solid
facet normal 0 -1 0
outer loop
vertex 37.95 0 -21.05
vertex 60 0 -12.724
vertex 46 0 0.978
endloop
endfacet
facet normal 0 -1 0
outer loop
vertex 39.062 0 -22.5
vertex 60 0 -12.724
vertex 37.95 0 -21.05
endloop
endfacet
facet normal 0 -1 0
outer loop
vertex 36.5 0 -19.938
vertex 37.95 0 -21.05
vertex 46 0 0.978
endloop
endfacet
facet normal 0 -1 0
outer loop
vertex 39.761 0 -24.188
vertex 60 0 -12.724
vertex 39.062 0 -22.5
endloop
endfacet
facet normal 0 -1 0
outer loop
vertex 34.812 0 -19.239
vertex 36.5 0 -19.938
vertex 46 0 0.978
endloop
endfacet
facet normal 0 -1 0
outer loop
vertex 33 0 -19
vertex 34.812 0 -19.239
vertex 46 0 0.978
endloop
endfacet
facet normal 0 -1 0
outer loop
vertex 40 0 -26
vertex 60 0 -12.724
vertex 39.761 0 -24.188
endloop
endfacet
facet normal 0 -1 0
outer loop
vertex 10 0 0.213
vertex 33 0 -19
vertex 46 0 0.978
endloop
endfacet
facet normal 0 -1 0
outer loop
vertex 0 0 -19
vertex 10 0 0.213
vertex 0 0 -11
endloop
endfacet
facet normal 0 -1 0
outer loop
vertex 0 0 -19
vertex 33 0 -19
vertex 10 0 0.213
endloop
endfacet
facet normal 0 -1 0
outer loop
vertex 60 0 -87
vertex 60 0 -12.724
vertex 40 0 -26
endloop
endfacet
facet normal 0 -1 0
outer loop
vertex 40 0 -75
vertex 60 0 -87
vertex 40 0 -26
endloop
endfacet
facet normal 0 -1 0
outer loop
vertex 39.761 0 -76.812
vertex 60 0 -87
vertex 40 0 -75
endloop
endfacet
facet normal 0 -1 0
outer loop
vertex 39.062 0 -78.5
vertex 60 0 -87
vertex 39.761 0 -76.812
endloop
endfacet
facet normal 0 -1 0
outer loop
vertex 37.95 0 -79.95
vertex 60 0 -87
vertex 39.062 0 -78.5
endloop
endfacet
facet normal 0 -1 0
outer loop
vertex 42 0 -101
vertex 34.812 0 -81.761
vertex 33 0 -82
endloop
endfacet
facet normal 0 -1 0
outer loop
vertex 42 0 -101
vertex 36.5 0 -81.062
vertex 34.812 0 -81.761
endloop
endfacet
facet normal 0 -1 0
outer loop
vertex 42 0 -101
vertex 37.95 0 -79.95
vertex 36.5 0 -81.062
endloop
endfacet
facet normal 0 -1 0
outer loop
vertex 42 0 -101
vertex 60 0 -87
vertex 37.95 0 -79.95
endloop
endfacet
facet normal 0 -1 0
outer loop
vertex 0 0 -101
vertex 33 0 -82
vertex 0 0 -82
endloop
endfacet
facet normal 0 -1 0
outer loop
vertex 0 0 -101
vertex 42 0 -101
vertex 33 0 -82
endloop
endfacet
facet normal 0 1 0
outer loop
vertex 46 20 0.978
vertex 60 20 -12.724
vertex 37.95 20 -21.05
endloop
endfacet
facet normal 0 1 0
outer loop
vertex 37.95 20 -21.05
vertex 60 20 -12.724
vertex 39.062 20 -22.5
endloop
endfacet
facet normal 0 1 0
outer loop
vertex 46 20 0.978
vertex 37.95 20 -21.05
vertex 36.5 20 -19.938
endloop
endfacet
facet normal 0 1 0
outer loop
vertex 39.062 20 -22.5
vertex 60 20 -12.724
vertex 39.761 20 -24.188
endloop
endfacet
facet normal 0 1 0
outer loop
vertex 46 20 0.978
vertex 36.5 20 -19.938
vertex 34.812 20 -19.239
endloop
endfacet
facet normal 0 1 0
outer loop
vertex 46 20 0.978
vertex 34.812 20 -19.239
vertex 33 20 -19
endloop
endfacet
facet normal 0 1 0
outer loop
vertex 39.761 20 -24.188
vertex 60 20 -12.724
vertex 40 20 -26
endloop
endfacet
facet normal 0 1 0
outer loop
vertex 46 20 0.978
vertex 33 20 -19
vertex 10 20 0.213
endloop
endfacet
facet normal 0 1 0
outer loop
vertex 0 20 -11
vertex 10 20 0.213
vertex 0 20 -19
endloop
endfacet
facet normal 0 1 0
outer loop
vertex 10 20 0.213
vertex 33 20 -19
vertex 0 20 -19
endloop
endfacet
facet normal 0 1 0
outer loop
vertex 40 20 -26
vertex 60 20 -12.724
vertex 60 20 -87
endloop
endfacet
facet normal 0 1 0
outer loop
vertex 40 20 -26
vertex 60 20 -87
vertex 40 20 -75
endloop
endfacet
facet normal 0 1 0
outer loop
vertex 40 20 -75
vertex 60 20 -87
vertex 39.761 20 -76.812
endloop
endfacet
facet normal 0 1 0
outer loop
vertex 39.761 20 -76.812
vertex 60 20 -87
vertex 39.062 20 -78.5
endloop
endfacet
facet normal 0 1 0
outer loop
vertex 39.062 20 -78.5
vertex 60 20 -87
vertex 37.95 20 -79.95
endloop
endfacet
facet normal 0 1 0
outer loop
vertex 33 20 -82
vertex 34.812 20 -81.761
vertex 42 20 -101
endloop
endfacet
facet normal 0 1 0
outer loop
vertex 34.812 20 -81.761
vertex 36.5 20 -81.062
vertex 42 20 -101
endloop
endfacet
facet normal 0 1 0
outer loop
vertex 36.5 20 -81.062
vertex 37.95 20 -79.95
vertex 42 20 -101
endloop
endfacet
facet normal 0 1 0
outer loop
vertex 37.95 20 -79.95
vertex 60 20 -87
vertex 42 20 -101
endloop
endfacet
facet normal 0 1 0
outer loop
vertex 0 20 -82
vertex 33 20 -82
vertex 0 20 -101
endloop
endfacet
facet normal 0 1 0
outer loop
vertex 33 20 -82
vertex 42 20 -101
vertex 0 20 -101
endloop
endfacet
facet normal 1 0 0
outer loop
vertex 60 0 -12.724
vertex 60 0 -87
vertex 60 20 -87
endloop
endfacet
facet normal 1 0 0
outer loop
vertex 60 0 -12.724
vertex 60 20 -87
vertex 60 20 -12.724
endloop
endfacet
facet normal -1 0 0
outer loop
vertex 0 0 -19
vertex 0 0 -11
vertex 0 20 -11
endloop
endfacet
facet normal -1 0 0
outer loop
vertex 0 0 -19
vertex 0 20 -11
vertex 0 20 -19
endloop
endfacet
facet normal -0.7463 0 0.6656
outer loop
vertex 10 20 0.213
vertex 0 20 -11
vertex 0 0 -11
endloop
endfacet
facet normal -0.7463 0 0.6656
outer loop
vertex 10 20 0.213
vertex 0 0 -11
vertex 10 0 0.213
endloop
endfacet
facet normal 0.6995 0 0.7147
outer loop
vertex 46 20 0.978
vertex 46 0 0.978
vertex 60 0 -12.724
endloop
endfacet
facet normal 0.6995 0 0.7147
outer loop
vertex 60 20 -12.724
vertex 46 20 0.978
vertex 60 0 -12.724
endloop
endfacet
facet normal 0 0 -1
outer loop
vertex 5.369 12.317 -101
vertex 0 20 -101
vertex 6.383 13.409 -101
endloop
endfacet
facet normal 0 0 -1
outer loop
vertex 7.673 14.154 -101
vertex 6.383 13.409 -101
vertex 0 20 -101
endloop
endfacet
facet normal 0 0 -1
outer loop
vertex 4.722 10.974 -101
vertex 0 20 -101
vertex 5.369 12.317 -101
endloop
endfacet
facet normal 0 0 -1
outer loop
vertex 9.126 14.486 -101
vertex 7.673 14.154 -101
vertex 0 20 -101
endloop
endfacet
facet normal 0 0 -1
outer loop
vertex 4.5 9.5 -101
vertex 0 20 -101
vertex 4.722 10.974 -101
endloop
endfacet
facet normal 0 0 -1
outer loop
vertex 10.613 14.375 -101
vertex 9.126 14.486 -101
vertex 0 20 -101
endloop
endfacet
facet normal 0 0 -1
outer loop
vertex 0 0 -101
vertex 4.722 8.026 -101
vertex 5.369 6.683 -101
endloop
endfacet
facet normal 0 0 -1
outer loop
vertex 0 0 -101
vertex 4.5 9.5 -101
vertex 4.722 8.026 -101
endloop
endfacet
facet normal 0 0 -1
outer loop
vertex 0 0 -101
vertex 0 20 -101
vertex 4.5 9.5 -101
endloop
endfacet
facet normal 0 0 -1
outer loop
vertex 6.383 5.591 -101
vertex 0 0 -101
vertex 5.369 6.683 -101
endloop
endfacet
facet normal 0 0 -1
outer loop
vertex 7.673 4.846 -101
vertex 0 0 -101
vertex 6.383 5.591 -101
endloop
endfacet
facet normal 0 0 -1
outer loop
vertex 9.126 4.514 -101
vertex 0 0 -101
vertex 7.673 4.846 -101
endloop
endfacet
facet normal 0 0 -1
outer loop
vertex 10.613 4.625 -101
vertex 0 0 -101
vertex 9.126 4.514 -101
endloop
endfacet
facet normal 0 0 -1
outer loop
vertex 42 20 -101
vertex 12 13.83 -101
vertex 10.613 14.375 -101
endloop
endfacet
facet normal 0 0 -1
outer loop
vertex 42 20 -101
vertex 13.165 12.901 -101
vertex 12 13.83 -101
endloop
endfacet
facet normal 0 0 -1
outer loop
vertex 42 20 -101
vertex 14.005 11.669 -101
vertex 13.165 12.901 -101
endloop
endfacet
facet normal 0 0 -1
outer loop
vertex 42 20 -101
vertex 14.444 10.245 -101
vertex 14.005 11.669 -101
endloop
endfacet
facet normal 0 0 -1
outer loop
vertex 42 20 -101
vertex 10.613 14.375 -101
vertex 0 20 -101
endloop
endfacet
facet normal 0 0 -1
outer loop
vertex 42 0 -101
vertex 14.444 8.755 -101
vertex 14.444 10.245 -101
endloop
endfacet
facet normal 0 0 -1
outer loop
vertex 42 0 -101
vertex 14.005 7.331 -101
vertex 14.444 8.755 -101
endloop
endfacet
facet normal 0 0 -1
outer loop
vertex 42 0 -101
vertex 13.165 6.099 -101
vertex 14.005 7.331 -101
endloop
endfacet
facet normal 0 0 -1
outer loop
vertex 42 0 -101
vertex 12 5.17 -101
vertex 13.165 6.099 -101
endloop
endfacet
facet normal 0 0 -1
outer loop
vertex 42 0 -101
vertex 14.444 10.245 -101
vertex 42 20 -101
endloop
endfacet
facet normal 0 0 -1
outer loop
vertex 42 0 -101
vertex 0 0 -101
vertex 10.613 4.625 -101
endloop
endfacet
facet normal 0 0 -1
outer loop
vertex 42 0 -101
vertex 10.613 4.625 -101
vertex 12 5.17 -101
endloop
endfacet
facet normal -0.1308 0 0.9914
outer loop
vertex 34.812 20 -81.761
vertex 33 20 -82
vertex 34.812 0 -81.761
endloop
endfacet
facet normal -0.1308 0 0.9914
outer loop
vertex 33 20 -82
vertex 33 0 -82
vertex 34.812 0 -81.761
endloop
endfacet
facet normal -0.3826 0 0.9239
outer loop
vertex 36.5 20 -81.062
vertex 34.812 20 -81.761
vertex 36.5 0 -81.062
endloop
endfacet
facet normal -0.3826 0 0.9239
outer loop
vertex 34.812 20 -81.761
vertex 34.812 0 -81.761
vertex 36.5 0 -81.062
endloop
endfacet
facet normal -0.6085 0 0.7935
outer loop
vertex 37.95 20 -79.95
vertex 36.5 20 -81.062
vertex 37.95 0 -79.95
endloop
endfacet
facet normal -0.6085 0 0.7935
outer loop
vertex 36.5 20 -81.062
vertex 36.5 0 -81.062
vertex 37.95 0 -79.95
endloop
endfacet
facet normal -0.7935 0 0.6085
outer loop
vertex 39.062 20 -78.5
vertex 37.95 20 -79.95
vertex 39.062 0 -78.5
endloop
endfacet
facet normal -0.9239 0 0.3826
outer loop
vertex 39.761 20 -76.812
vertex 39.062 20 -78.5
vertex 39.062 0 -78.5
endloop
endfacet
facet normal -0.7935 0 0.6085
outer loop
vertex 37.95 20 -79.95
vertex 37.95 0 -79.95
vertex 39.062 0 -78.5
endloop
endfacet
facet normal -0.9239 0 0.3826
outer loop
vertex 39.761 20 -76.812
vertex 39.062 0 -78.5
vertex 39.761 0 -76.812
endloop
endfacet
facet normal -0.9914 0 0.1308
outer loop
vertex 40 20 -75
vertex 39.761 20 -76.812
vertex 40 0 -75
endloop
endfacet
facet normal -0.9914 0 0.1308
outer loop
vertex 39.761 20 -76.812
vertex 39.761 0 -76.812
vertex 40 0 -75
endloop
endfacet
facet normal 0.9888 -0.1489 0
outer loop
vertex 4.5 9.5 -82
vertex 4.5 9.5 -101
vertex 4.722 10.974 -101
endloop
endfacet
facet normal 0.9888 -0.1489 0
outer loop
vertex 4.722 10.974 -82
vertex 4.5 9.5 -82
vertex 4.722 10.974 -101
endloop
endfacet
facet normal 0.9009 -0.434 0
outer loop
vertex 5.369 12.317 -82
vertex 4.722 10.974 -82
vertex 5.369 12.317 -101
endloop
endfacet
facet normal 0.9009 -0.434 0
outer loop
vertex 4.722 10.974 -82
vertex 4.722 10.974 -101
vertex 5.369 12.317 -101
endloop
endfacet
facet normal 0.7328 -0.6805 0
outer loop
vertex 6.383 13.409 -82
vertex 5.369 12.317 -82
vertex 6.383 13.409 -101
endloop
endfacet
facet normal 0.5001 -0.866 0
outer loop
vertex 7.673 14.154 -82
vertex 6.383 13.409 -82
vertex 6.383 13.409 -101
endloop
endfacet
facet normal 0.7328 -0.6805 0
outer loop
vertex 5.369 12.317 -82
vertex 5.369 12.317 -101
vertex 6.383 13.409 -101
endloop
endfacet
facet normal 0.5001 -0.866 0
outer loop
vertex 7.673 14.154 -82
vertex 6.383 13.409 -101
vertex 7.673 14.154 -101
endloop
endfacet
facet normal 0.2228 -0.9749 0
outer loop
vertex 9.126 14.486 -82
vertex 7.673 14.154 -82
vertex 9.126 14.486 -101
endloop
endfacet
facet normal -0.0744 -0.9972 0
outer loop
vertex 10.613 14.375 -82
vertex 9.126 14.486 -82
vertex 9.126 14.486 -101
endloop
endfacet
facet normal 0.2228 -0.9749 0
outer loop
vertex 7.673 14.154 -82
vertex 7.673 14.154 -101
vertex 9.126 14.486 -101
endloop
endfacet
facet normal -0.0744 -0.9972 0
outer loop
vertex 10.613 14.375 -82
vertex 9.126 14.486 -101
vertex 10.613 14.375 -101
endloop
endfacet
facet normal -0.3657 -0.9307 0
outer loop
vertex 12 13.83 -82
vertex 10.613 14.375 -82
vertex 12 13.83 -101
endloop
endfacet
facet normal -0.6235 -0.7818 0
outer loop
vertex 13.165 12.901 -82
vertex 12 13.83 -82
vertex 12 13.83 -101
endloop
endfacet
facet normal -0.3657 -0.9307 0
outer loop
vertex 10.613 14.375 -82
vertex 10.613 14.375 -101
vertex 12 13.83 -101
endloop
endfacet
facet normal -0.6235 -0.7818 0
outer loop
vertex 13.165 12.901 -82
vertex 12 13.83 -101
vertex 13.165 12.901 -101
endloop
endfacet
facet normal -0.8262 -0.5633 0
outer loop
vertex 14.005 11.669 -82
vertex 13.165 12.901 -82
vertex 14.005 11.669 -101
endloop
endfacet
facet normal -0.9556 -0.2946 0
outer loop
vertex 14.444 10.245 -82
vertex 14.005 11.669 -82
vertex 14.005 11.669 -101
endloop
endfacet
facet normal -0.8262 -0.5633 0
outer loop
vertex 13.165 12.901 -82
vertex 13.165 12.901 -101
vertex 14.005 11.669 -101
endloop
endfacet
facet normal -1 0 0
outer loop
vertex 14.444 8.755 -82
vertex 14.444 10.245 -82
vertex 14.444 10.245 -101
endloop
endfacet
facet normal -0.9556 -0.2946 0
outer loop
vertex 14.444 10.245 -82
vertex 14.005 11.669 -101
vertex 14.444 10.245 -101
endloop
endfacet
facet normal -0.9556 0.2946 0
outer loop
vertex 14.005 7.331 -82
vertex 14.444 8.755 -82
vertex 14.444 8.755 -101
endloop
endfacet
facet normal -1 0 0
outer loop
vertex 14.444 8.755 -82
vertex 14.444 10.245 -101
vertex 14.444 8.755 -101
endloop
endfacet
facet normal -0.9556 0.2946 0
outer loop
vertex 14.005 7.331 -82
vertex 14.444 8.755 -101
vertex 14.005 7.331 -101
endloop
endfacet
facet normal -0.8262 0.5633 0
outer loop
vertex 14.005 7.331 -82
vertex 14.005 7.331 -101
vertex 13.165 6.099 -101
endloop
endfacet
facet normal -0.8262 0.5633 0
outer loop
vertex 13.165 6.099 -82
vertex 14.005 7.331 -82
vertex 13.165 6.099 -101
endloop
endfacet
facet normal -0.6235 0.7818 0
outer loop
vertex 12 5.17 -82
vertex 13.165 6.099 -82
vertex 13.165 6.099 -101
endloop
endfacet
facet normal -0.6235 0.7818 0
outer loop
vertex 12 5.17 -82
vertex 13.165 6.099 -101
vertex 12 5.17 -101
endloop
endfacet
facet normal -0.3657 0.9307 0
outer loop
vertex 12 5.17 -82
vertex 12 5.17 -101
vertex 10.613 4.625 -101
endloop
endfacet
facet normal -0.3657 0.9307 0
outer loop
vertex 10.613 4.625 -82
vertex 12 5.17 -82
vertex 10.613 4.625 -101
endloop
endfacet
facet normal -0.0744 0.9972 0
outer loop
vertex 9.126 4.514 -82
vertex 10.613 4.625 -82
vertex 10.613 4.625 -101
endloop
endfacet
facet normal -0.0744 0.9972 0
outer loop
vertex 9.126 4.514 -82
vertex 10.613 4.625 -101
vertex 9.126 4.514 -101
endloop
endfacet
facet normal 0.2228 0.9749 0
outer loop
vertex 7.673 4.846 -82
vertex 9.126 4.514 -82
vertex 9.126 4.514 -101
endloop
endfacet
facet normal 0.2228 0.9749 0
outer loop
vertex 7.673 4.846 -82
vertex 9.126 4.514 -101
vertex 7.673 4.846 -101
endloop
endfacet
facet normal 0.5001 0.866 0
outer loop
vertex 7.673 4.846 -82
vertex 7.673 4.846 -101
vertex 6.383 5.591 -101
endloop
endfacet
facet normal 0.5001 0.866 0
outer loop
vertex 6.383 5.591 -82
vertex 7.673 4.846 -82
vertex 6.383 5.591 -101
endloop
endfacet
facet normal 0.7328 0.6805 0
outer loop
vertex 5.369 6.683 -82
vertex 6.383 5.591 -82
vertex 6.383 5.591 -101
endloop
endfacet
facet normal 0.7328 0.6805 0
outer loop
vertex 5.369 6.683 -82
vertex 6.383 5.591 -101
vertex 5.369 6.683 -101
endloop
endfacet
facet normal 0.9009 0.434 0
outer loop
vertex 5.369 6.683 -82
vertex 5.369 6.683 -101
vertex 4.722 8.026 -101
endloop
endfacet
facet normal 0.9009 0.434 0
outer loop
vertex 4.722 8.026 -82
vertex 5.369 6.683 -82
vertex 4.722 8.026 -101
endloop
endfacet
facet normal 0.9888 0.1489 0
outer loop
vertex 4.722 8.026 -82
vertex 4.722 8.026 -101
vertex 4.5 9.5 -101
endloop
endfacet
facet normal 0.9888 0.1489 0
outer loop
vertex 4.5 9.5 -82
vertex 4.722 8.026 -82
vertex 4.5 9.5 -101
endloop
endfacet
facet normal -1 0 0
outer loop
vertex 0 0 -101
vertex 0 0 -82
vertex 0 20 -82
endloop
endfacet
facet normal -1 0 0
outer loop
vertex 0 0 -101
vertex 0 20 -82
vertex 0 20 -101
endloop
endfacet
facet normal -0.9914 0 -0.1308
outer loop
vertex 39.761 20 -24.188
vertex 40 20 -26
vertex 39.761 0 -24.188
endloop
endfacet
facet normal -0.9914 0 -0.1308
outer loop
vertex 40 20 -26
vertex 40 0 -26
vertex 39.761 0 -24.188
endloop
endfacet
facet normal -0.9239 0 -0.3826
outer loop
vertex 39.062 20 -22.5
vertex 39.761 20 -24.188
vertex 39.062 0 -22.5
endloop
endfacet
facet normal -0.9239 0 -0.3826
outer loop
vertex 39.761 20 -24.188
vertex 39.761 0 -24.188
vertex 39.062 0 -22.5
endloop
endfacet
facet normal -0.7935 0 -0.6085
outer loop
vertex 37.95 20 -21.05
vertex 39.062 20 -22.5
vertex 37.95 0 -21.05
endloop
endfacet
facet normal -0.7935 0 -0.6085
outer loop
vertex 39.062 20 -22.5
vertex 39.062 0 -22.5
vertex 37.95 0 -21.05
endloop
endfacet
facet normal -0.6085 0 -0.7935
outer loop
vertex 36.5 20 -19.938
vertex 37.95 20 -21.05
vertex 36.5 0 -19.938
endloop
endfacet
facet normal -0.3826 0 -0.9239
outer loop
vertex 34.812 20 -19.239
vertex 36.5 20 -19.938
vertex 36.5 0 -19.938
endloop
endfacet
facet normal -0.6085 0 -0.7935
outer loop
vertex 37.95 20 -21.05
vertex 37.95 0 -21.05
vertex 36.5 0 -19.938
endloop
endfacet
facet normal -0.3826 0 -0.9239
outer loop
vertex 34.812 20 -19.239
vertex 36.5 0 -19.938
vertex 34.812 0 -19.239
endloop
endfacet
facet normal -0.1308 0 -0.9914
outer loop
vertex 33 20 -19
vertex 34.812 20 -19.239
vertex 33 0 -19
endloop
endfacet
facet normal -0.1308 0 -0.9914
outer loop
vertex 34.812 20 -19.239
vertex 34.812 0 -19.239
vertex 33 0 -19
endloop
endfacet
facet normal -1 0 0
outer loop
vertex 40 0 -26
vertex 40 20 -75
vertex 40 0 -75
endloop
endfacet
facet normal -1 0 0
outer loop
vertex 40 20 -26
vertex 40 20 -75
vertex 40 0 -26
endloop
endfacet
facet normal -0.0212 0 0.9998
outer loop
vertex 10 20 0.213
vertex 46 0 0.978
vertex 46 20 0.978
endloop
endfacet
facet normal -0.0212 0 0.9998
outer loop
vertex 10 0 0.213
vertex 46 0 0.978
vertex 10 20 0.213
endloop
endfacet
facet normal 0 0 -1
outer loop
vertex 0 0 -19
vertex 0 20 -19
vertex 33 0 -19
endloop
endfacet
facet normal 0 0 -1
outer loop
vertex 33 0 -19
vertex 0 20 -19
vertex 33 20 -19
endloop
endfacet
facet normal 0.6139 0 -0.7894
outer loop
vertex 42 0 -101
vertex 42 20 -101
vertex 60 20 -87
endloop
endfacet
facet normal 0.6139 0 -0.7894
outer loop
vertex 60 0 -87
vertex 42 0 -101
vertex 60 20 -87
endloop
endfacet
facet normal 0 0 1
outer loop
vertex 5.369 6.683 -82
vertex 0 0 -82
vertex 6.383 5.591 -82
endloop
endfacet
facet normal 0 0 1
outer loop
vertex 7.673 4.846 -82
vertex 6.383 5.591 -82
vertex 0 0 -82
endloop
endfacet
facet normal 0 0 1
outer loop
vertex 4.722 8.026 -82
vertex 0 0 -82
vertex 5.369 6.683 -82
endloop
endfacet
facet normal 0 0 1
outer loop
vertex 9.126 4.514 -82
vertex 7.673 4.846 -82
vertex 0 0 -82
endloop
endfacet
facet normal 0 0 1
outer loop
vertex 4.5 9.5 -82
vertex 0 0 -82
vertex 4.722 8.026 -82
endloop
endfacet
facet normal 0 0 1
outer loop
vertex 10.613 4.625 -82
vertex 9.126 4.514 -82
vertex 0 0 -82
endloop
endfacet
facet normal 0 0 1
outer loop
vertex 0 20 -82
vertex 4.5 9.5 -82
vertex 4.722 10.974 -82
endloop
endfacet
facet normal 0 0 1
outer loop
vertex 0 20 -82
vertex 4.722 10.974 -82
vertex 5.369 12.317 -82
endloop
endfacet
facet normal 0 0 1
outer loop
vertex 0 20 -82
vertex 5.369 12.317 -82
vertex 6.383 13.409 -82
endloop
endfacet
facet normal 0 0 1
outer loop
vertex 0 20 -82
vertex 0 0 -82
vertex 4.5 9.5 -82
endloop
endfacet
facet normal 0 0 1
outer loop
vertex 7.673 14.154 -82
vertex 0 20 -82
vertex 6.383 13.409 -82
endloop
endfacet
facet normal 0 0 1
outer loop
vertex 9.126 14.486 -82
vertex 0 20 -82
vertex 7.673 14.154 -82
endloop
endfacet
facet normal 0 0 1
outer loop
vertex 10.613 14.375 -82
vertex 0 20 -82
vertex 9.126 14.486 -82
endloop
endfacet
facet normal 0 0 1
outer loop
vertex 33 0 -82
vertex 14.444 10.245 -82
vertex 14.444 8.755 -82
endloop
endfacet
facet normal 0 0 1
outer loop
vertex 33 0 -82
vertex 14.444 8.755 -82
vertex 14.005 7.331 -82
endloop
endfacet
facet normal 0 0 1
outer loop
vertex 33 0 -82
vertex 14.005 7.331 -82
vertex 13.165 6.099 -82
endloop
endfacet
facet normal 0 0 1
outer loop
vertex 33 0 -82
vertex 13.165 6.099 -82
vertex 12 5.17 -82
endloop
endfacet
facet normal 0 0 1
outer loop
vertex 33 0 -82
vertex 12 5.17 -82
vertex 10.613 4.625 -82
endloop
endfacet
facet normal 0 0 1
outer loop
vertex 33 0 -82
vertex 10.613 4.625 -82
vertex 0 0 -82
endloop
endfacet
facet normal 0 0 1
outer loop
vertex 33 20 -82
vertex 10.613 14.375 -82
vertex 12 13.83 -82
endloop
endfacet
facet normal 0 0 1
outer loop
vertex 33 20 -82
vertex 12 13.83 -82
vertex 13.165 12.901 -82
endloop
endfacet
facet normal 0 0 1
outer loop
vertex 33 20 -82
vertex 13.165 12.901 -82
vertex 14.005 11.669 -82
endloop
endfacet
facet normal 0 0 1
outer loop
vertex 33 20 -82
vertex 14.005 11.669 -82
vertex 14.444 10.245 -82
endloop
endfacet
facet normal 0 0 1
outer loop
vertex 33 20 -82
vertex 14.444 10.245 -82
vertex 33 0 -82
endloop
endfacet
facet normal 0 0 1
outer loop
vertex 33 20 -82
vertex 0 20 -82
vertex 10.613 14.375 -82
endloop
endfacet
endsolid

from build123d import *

# Parameters (mm, degrees)
BOSS_EXTRUDE1_DEPTH = 20
CUT_EXTRUDE1_DEPTH  = 20
CUT_EXTRUDE2_DEPTH  = 20
SKETCH4_W           = 36.5
SKETCH4_H           = 63
CUT_EXTRUDE3_DEPTH  = 20
FILLET1_R           = 7
FILLET2_R           = 7
SKETCH5_R           = 5
CUT_EXTRUDE4_DEPTH  = 20
CUT_EXTRUDE5_DEPTH  = 20
FILLET3_R           = 7
FILLET4_R           = 7


with BuildPart() as part:
    # Sketch1 → Boss-Extrude1 (new body)
    with BuildSketch(Plane(origin=(0, 0, 0), x_dir=(1, 0, 0), z_dir=(0, 1, 0))):
        Polygon((0, 0), (0, 101), (60, 101), (60, -1.275996113), align=None)
    extrude(amount=BOSS_EXTRUDE1_DEPTH)

    # Sketch2 → Cut-Extrude1 (cut)
    with BuildSketch(Plane(origin=(0, 20, 0), x_dir=(1, 0, 0), z_dir=(0, 1, 0))):
        Polygon((60, 101), (42, 101), (60, 87), align=None)
    extrude(amount=-CUT_EXTRUDE1_DEPTH, mode=Mode.SUBTRACT)

    # Sketch3 → Cut-Extrude2 (cut)
    with BuildSketch(Plane(origin=(0, 20, 0), x_dir=(1, 0, 0), z_dir=(0, 1, 0))):
        Polygon((60, -1.275996113), (46, -0.978263686), (60, 12.724003887), align=None)
        Polygon((10, -0.212666019), (0, 0), (0, 11), align=None)
    extrude(amount=-CUT_EXTRUDE2_DEPTH, mode=Mode.SUBTRACT)

    # Sketch4 → Cut-Extrude3 (cut)
    with BuildSketch(Plane(origin=(0, 20, 0), x_dir=(1, 0, 0), z_dir=(0, 1, 0))):
        with Locations((18.25, 50.5)):
            Rectangle(SKETCH4_W, SKETCH4_H)
    extrude(amount=-CUT_EXTRUDE3_DEPTH, mode=Mode.SUBTRACT)

    # Fillet1
    fillet1_edges = [part.edges().sort_by_distance(p)[0] for p in [
        (36.5, 10, -82),
    ]]
    fillet(fillet1_edges, radius=FILLET1_R)

    # Fillet2
    fillet2_edges = [part.edges().sort_by_distance(p)[0] for p in [
        (36.5, 10, -19),
    ]]
    fillet(fillet2_edges, radius=FILLET2_R)

    # Sketch5 → Cut-Extrude4 (cut)
    with BuildSketch(Plane(origin=(0, 0, -101), x_dir=(-1, 0, 0), z_dir=(0, 0, -1))):
        with Locations((-9.5, 9.5)):
            Circle(SKETCH5_R)
    extrude(amount=-CUT_EXTRUDE4_DEPTH, mode=Mode.SUBTRACT)

    # Sketch7 → Cut-Extrude5 (cut)
    with BuildSketch(Plane(origin=(0, 20, 0), x_dir=(1, 0, 0), z_dir=(0, 1, 0))):
        Polygon((29.5, 82), (40, 82), (40, 19), (0, 19), (0, 82), align=None)
    extrude(amount=-CUT_EXTRUDE5_DEPTH, mode=Mode.SUBTRACT)

    # Fillet3
    fillet3_edges = [part.edges().sort_by_distance(p)[0] for p in [
        (40, 10, -82),
    ]]
    fillet(fillet3_edges, radius=FILLET3_R)

    # Fillet4
    fillet4_edges = [part.edges().sort_by_distance(p)[0] for p in [
        (40, 10, -19),
    ]]
    fillet(fillet4_edges, radius=FILLET4_R)


solid = part.part
